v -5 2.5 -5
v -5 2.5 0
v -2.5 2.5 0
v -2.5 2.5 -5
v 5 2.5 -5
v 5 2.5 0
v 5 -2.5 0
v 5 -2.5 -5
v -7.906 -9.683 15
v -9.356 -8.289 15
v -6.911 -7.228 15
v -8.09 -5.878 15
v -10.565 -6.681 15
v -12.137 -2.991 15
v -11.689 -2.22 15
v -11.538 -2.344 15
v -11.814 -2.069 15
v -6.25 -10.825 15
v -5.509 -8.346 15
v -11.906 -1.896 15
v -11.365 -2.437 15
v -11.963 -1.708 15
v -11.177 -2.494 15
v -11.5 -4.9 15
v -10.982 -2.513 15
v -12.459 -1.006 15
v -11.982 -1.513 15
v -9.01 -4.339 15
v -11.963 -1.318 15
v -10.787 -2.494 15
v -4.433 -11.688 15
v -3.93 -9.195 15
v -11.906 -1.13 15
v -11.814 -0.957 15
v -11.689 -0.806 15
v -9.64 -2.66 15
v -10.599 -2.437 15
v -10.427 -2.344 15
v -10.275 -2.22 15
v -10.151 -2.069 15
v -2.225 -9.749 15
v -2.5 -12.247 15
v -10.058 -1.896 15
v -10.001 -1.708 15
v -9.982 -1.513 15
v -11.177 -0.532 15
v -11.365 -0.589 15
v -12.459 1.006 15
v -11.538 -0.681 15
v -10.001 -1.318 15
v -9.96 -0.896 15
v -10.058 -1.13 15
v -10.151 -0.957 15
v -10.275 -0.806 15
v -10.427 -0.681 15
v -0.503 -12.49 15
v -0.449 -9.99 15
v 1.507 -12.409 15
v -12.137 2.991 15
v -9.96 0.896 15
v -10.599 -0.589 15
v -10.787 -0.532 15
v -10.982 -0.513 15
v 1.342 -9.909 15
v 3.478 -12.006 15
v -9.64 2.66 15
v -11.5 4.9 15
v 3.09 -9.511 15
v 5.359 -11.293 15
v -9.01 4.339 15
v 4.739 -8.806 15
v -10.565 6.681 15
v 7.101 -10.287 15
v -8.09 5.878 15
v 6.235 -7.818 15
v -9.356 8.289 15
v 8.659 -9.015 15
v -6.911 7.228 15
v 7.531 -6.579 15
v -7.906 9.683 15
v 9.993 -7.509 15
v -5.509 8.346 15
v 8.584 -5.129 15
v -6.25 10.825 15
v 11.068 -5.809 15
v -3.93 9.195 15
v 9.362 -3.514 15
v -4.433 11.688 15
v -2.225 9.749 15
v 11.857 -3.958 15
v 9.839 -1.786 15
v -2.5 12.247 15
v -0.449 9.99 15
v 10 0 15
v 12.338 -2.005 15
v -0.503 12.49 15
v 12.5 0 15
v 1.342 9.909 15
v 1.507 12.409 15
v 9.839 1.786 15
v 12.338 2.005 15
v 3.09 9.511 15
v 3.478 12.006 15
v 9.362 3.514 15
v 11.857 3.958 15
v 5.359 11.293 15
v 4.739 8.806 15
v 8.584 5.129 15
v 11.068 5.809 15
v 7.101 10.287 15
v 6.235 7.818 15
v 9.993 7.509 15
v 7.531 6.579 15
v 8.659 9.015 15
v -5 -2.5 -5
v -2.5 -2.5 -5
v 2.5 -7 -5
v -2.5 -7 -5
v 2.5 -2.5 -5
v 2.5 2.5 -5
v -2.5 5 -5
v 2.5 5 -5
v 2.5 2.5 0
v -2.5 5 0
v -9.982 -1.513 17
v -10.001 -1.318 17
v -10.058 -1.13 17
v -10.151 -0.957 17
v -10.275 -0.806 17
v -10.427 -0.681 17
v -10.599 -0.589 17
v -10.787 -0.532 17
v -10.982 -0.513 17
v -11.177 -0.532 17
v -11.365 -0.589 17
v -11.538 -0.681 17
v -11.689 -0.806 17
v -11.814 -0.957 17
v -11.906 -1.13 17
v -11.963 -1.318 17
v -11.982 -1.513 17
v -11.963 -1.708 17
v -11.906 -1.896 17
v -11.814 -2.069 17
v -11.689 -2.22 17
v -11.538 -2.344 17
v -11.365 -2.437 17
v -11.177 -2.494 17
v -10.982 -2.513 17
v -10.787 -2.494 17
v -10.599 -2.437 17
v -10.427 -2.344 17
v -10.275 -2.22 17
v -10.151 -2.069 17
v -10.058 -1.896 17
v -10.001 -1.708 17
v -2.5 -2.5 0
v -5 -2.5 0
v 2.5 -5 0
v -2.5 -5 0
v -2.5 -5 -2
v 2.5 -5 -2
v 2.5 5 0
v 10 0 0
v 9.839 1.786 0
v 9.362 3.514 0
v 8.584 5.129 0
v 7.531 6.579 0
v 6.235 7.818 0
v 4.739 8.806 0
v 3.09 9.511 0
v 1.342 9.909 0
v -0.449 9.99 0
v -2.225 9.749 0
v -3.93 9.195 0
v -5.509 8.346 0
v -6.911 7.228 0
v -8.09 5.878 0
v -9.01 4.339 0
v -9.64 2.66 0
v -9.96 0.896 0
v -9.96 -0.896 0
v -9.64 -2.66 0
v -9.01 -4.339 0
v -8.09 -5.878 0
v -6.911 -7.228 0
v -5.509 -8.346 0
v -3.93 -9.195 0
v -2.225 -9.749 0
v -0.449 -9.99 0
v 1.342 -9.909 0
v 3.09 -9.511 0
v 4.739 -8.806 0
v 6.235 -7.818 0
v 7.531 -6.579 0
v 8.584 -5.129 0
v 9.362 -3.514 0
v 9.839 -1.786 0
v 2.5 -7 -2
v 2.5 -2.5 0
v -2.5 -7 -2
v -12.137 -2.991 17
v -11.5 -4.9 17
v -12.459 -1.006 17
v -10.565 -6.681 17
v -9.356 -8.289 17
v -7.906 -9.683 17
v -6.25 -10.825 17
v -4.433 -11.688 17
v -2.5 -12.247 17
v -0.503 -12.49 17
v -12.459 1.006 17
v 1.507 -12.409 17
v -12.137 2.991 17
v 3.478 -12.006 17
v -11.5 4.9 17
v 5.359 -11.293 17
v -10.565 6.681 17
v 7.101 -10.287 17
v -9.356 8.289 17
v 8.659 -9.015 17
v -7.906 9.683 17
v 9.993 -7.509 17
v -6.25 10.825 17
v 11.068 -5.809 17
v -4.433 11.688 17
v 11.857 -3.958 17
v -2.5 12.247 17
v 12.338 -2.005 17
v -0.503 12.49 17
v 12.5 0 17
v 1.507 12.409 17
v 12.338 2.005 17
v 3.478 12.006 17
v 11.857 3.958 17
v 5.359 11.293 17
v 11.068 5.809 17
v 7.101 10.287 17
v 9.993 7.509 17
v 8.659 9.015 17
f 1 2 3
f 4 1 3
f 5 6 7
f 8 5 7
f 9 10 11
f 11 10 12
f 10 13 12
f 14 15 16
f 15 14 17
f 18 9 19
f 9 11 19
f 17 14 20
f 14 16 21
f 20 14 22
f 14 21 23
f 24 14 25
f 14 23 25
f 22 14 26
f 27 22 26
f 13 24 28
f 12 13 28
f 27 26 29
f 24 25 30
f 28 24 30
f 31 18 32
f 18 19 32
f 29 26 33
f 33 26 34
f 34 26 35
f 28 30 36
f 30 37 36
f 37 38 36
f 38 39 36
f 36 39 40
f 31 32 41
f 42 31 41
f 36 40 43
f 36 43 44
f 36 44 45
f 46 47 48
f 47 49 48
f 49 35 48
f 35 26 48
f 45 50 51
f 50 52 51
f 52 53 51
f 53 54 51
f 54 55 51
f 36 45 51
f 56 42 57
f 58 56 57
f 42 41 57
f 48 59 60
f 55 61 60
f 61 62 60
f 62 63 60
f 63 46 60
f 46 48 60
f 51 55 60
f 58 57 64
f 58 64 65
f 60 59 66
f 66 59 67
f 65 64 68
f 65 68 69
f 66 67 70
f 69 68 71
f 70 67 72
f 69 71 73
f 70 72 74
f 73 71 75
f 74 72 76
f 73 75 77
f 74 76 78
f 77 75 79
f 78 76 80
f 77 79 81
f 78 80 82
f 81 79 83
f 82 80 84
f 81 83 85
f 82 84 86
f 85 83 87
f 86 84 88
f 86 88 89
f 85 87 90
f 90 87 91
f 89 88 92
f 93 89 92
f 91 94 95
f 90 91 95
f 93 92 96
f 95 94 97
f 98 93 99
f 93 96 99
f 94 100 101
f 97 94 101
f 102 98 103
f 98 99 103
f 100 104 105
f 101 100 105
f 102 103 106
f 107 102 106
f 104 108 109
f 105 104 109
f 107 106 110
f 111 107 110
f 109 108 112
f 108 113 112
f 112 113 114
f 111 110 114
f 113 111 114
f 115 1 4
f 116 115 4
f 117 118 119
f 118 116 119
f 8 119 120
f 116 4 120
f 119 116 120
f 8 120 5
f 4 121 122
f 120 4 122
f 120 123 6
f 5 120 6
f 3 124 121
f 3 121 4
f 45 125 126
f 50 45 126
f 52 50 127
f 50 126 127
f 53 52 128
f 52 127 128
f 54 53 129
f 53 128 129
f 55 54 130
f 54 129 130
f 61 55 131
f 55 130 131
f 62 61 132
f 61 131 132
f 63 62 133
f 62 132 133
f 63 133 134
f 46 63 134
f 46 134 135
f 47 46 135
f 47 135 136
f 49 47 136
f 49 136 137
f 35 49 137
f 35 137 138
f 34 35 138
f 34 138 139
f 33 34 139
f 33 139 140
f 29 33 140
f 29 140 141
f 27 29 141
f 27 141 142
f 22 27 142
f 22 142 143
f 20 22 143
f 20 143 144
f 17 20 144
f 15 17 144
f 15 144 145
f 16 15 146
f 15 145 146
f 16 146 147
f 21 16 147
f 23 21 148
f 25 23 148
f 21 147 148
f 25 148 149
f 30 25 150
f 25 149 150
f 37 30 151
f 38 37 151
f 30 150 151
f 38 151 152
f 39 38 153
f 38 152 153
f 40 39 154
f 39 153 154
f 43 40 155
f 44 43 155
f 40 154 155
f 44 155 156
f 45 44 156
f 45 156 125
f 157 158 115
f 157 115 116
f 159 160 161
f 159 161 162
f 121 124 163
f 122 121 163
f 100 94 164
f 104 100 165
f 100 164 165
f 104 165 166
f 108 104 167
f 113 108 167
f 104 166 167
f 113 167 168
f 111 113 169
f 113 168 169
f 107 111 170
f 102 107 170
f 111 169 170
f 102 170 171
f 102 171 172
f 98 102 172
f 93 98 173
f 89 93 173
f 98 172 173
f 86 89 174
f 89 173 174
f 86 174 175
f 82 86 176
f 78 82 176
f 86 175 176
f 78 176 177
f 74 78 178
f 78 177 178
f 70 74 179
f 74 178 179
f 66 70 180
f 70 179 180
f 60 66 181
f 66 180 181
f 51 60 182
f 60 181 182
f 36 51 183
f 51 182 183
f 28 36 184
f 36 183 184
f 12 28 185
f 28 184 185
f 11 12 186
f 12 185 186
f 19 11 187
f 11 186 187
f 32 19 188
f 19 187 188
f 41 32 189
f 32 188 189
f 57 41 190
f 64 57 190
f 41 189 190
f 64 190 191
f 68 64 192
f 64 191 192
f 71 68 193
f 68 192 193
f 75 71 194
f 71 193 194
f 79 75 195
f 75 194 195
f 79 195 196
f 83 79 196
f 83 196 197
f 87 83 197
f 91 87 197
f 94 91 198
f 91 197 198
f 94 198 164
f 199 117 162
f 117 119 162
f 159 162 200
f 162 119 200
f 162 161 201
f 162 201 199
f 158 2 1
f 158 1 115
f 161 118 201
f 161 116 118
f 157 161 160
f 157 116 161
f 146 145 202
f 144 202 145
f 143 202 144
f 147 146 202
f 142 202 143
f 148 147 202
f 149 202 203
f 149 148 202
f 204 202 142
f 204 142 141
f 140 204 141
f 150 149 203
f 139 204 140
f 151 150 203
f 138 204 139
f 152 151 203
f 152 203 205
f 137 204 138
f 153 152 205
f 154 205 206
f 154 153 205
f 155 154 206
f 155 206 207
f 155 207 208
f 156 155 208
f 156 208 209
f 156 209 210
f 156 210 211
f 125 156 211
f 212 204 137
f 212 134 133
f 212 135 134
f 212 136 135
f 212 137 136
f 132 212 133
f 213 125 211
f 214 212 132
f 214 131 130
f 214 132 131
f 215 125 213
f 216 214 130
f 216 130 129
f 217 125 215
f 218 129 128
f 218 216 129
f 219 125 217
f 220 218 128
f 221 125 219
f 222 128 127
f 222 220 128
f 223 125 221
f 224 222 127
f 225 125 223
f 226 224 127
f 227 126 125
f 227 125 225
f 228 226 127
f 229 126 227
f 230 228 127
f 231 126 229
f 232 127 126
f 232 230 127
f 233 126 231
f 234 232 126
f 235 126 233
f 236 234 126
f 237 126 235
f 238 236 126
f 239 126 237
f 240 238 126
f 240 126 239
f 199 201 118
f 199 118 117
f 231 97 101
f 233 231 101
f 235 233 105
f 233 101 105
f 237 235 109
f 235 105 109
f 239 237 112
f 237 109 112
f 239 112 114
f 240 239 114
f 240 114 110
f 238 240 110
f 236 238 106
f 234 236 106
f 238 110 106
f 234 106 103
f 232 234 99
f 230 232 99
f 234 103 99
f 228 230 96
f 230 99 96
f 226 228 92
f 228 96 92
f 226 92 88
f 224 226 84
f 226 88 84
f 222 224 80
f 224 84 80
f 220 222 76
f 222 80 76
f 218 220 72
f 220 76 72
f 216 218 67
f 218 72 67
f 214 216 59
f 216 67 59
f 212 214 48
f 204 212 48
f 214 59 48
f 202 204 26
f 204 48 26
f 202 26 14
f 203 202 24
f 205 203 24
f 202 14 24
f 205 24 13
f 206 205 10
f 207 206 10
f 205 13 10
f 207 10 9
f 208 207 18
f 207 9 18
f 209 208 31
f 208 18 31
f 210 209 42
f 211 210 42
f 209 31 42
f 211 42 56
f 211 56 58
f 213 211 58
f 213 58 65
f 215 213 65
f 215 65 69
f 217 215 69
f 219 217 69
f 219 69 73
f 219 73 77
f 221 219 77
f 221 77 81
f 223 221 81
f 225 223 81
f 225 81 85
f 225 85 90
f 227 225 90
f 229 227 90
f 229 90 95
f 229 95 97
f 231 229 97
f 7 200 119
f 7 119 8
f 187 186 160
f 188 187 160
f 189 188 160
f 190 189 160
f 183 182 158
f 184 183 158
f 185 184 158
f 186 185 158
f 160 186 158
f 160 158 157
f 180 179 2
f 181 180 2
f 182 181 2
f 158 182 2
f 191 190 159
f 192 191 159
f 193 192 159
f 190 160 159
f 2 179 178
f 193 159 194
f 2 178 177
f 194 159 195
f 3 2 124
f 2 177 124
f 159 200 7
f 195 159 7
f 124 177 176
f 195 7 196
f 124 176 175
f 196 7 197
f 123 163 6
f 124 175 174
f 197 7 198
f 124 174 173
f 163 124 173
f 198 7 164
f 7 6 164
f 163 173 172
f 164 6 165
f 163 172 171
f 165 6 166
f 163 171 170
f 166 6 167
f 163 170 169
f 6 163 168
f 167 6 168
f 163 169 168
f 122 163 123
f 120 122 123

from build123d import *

# Parameters (mm, degrees)
F0_R     = 10
F1_DEPTH = 15
F2_R     = 12.5
F3_DEPTH = 2
F4_W     = 2.5
F4_H     = 5
F4_W_2   = 5
F4_H_2   = 2.5
F5_DEPTH = 5
F6_W     = 5
F6_H     = 3
F7_DEPTH = 2
F8_R     = 1
F9_DEPTH = 3


with BuildPart() as f1:
    # F0 (on Top) → F1 (new body)
    with BuildSketch(Plane.XY):
        Circle(F0_R)
    extrude(amount=F1_DEPTH)

    # F2 (on face) → F3 (join)
    with BuildSketch(Plane.XY.offset(15)):
        Circle(F2_R)
    extrude(amount=F3_DEPTH)

    # F4 (on face) → F5 (join)
    with BuildSketch(Plane(origin=(0, 0, 0), x_dir=(1, 0, 0), z_dir=(0, 0, -1))):
        with Locations((-3.75, 0)):
            Rectangle(F4_W, F4_H)
        with Locations((0, 3.75)):
            Rectangle(F4_W_2, F4_H_2)
        Rectangle(F4_W_2, F4_H)
        with Locations((3.75, 0)):
            Rectangle(F4_W, F4_H)
        with Locations((0, -3.75)):
            Rectangle(F4_W_2, F4_H_2)
    extrude(amount=F5_DEPTH)

    # F6 (on face) → F7 (join)
    with BuildSketch(Plane.XZ.offset(5)):
        with Locations((0, -3.5)):
            Rectangle(F6_W, F6_H)
    extrude(amount=F7_DEPTH)

    # F8 (on face) → F9 (cut)
    with BuildSketch(Plane.XY.offset(17)):
        with Locations((-10.9821680997, -1.5129518582)):
            Circle(F8_R)
    extrude(amount=-F9_DEPTH, mode=Mode.SUBTRACT)


solid = f1.part
